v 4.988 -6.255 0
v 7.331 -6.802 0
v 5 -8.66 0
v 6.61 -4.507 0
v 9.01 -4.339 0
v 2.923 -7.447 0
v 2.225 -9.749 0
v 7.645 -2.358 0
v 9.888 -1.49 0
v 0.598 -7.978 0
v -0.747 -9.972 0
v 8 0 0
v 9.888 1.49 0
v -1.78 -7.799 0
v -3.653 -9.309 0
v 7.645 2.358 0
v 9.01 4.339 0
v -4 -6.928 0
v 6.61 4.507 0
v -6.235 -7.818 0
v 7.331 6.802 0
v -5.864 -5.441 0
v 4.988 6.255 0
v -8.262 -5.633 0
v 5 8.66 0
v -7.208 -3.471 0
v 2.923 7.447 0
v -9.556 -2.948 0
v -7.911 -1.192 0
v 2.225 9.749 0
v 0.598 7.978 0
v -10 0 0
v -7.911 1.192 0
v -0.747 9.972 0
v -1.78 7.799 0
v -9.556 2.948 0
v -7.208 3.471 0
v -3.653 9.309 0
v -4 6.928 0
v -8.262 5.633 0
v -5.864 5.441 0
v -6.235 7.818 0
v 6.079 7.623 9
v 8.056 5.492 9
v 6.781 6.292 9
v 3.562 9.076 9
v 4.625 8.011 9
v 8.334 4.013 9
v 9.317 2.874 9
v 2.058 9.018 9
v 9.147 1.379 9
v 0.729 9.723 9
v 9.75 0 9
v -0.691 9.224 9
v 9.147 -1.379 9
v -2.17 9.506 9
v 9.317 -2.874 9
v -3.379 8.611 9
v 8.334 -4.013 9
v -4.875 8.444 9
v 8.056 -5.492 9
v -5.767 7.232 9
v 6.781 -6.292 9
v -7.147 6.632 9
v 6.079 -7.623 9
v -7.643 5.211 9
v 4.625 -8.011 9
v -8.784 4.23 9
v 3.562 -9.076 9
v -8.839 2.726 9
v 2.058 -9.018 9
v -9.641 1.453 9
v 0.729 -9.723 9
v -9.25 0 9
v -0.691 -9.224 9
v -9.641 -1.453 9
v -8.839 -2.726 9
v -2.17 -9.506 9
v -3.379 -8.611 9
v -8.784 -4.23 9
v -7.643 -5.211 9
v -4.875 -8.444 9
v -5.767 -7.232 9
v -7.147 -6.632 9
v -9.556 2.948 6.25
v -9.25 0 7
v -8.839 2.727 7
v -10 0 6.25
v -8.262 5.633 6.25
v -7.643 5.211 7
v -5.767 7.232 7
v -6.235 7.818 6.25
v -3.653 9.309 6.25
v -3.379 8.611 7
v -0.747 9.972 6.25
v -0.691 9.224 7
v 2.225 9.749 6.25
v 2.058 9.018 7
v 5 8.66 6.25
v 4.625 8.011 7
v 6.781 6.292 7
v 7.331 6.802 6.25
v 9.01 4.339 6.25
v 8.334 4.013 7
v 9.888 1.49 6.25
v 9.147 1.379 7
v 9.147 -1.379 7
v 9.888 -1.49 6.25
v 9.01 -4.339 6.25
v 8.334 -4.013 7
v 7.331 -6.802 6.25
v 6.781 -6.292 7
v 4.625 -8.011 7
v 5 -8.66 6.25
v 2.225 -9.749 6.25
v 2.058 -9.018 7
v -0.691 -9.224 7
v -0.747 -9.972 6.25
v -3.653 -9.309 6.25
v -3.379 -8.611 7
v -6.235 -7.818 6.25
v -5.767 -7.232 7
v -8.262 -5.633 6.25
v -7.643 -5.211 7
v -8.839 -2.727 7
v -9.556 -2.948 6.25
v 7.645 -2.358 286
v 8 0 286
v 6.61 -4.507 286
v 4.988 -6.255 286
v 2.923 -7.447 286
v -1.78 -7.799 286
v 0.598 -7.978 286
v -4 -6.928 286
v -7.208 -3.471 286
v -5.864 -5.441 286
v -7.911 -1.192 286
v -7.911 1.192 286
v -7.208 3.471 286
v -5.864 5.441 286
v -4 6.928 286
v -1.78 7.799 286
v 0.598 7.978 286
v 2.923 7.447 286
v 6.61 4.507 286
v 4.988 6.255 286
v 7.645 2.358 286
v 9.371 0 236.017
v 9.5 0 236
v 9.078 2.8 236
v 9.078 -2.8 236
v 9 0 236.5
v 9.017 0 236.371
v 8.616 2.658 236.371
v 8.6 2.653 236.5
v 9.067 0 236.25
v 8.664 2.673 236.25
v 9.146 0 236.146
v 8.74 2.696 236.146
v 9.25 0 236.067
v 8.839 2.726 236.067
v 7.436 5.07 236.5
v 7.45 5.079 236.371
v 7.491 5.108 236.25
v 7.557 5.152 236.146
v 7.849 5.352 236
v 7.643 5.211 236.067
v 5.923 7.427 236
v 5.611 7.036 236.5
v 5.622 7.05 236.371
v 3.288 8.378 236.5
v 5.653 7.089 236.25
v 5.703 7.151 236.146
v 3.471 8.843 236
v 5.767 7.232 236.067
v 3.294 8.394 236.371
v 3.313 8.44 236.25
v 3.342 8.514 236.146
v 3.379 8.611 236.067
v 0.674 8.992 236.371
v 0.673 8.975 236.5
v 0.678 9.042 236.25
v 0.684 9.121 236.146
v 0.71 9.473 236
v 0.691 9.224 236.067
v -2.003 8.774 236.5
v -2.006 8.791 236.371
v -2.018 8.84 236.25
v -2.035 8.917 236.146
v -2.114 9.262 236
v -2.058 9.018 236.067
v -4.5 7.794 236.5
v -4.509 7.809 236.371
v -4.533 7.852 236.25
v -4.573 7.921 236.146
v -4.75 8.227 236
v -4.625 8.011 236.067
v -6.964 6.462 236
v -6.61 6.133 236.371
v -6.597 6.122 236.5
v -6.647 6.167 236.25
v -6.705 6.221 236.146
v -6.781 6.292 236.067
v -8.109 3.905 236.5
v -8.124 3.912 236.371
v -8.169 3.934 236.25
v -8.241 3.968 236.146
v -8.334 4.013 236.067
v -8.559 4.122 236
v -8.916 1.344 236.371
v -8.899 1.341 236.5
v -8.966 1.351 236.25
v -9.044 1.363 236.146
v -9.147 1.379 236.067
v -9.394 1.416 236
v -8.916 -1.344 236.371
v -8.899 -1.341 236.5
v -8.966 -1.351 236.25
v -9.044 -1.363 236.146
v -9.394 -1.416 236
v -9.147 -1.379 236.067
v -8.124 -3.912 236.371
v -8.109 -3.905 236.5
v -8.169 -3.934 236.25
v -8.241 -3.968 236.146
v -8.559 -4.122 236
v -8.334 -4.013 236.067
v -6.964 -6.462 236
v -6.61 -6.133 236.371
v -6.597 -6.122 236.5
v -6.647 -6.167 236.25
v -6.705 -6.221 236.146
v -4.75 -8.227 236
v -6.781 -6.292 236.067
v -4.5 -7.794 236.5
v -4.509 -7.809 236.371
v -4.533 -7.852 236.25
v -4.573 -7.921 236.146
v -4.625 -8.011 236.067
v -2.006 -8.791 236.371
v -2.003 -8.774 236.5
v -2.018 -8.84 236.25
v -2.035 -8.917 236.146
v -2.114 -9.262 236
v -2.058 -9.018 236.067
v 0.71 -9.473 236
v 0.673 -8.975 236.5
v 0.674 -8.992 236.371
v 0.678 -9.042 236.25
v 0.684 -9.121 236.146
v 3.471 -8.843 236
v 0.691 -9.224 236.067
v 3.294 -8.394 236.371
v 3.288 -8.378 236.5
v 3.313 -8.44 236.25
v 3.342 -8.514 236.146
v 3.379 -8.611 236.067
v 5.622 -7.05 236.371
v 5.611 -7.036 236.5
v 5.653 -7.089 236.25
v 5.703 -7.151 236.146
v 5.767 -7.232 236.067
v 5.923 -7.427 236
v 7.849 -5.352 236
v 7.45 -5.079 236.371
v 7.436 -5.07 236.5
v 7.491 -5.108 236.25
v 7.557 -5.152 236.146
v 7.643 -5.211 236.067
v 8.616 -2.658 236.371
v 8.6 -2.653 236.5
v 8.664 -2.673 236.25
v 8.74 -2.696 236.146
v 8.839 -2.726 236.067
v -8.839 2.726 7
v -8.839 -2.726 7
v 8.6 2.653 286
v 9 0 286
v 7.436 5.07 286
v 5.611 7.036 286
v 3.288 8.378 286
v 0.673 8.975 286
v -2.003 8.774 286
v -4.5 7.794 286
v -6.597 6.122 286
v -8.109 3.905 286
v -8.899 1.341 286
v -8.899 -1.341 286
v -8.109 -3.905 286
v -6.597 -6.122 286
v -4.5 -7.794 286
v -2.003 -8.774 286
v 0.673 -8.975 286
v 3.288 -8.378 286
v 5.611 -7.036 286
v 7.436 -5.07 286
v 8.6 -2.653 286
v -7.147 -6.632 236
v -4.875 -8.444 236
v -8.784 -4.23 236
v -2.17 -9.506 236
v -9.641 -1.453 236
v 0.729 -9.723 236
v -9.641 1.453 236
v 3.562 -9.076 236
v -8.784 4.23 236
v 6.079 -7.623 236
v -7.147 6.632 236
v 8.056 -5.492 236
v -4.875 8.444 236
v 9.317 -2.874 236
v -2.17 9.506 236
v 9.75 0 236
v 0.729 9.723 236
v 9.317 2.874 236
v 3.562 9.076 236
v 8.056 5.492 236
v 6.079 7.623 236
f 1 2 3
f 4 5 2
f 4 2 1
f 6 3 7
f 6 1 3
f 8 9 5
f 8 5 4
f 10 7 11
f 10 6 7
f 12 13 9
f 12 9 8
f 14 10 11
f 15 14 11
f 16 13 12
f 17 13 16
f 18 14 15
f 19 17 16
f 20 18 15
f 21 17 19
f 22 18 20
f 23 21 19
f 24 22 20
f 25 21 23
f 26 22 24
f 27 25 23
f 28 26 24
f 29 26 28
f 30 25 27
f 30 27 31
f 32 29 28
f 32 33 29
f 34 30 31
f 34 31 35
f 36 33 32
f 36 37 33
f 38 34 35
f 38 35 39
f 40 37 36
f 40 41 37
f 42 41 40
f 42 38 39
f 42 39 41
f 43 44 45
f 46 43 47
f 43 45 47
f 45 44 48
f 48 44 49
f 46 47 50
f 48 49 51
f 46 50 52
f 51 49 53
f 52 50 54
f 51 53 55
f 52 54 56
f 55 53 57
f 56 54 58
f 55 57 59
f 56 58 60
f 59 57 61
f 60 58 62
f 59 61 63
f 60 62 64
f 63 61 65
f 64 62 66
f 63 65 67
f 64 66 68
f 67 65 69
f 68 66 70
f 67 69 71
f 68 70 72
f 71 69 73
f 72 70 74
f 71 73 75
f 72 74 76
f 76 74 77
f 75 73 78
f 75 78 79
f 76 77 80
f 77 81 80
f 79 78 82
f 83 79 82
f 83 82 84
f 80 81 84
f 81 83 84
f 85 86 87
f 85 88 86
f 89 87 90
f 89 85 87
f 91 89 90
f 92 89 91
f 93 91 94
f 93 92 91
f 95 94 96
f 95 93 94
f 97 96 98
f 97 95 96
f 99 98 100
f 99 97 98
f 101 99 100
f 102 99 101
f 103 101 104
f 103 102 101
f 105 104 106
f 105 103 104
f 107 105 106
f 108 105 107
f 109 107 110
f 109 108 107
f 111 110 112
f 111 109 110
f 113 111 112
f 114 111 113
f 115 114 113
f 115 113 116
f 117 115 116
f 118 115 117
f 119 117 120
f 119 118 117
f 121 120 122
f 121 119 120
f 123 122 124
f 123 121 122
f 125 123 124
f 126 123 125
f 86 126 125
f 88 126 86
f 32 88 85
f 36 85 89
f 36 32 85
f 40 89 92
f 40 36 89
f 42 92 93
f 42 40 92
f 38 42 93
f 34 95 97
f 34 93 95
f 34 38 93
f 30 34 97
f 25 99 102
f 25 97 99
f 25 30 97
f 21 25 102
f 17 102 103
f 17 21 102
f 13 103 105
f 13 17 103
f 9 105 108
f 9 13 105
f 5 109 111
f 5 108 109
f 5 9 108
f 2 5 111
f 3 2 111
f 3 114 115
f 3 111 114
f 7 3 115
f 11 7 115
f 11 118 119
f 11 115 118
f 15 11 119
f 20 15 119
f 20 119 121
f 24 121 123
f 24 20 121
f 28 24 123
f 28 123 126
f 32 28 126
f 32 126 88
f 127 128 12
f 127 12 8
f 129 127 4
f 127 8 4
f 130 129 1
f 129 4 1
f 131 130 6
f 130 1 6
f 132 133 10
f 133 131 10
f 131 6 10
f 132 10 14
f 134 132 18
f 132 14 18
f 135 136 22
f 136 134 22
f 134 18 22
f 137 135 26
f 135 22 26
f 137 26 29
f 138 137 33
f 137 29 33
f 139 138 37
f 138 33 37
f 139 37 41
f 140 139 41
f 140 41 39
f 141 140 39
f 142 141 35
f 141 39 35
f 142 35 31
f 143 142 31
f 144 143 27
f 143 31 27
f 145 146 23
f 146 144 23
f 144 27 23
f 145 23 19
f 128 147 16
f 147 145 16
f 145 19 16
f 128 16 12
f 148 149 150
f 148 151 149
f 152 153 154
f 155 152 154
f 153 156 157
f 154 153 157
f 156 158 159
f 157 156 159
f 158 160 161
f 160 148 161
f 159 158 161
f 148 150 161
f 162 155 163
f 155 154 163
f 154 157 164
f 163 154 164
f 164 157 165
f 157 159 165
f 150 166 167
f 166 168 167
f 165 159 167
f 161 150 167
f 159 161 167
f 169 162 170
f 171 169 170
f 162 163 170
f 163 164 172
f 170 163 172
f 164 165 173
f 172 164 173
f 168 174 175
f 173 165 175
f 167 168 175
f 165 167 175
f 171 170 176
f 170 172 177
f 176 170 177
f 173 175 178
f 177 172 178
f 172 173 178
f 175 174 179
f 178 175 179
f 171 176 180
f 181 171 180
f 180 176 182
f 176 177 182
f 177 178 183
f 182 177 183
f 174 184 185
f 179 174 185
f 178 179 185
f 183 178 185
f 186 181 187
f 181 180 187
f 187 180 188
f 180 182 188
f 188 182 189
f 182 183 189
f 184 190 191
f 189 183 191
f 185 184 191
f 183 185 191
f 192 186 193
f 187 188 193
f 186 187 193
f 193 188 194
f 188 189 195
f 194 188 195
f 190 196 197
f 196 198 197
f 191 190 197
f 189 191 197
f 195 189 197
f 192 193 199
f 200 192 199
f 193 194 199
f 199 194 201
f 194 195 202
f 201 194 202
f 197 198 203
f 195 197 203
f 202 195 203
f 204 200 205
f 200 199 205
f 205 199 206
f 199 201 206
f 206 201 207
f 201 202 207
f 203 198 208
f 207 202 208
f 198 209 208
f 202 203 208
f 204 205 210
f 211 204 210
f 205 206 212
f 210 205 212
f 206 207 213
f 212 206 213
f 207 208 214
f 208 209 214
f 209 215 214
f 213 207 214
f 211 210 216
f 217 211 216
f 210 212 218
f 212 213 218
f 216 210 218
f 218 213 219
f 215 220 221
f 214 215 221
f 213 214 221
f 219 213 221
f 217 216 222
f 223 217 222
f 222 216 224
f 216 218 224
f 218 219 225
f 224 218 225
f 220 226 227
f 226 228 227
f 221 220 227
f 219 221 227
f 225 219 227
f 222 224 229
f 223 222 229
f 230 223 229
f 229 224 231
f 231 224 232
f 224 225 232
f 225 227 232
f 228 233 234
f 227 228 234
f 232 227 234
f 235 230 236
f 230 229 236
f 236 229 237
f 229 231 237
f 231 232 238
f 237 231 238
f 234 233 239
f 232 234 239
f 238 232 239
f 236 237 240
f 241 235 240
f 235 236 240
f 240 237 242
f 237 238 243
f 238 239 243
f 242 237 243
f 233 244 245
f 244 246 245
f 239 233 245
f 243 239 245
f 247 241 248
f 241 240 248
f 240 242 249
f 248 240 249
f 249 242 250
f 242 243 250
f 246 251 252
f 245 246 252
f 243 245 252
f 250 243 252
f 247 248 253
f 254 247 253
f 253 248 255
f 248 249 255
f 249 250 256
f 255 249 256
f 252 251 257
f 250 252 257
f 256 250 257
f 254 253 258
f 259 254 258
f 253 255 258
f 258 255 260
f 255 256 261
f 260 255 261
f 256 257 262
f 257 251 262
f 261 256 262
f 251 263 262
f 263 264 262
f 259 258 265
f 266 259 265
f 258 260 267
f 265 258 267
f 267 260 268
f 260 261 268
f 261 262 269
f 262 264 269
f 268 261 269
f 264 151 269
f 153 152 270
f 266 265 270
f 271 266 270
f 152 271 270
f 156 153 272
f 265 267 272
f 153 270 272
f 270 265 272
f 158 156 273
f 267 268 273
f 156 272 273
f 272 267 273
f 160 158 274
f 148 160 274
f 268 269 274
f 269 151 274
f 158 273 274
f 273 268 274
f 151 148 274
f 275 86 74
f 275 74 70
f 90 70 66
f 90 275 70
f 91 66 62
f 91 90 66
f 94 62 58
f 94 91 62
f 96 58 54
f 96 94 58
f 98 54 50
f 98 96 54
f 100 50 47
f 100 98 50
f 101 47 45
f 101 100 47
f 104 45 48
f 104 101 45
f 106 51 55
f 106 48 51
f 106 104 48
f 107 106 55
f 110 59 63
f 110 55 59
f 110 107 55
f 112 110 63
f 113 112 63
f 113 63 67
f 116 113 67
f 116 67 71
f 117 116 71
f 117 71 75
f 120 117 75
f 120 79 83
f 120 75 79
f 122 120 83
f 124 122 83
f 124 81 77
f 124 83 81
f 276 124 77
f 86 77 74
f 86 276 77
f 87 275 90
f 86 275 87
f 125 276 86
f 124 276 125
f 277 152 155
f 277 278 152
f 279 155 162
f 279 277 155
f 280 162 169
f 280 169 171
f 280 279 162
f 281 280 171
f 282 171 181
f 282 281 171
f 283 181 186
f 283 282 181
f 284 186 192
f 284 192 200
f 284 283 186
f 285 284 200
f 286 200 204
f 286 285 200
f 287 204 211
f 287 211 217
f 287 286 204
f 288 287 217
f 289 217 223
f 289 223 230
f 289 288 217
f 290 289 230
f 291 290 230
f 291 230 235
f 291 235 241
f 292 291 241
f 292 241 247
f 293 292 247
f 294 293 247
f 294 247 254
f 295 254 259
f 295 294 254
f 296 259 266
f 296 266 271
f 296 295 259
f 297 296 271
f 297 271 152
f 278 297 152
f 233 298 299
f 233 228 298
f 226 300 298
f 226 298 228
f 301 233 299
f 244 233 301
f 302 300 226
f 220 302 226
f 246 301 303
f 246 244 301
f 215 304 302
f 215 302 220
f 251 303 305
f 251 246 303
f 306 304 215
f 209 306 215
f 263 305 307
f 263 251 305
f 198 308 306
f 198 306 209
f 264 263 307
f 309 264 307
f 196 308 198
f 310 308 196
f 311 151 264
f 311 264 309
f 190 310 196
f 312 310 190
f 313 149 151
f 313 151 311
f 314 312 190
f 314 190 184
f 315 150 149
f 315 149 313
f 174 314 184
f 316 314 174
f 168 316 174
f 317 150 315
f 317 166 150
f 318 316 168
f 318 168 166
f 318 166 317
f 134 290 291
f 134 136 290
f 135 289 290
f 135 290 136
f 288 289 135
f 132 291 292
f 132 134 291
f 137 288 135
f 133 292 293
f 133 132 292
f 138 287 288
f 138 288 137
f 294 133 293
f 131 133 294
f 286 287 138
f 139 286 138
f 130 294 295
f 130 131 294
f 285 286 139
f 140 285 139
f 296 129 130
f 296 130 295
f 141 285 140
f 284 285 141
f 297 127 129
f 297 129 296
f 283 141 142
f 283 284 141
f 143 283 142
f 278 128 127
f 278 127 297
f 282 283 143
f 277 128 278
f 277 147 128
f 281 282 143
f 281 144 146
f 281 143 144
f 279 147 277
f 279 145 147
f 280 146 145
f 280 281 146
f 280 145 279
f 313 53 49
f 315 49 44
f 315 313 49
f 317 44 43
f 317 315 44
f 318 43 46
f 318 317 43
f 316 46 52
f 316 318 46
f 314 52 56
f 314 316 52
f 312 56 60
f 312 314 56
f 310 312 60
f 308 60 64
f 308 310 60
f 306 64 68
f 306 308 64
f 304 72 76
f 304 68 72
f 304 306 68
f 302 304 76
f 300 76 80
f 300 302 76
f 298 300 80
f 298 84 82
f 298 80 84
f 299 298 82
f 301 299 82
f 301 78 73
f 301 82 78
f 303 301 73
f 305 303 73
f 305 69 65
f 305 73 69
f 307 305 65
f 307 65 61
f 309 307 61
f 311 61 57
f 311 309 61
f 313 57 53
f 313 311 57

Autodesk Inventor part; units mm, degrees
ref_plane "YZ Plane" through (0, 0, 0) normal (1, 0, 0) x (0, 1, 0)
ref_plane "XZ Plane" through (0, 0, 0) normal (0, 1, 0) x (-1, 0, 0)
ref_plane "XY Plane" through (0, 0, 0) normal (0, 0, 1) x (1, 0, 0)
sketch "Skizze1" plane through (0, 0, 0) normal (0, 0, 1) x (1, 0, 0)
  circle A0 centre (0, 0) radius 8
  circle A1 centre (0, 0) radius 10.05
  dimension "d0" = 20.1
  dimension "d1" = 2.05
extrude "Extrusion1" add sketch "Skizze1" along normal blind 286
sketch "Skizze2" plane through (0, 0, 286) normal (0, 0, 1) x (1, 0, 0)
  circle A0 centre (0, 0) radius 10.05 projected
  circle A1 centre (0, 0) radius 9.75
  dimension "d4" = 19.5
extrude "Extrusion2" cut sketch "Skizze2" against normal through all
sketch "Skizze3" plane through (0, 0, 0) normal (0, 0, -1) x (-1, 0, 0)
  circle A0 centre (0, 0) radius 9.75 projected
  circle A1 centre (0, 0) radius 8 projected
  circle A2 centre (0, 0) radius 10
  dimension "d7" = 20
extrude "Extrusion3" add sketch "Skizze3" against normal blind 9 contours A2
sketch "Skizze4" plane through (0, 0, 286) normal (0, 0, 1) x (1, 0, 0)
  circle A0 centre (0, 0) radius 9.75 projected
  circle A1 centre (0, 0) radius 8 projected
  circle A2 centre (0, 0) radius 9
  dimension "d10" = 18
extrude "Extrusion4" cut sketch "Skizze4" against normal blind 50 contours A0
sketch "Skizze5" plane through (0, 0, 0) normal (0, 1, 0) x (-1, 0, 0)
  line L0 (-10, 9) -> (10, 9) projected
  line L1 (10, 0) -> (-10, 0) projected
  line L2 (-9.75, 236) -> (9.75, 236) projected
  line L3 (10, 0) -> (10, 9) projected
  line L4 (8, 0) -> (8, 286) projected
  line L5 (9.75, 236) -> (9.75, 9) projected
  line L6 (10, 9) -> (9.25, 9)
  line L7 (9.25, 9) -> (9.25, 7)
  line L8 (9.25, 7) -> (10, 7)
  line L9 (10, 7) -> (10, 9)
  line L10 (14, 0) -> (-14, 0) projected
  line L11 (0, -57.2) -> (0, 343.2) projected
  point P0 (0, 0)
  point P1 (9.9, 9)
  point P2 (-9.9, 9)
  point P3 (9.75, 9)
  dimension "d13" = 2
  dimension "d14" = 18.5
revolve "Umdrehung1" cut sketch "Skizze5" angle 360 about axis through (0, 0, -10) along (0, 0, 1) contours L0 L3 L8 L7
chamfer "Fase1" distance 0.75 angle 45 1 edges at (10, 0, 7)
thread "Gewinde2" size "M20x1" class "6g" standard "ANSI Metric M Profile" full length
fillet "Rundung1" radius 0.5 1 edges at (-9, 0, 236)
properties part number "13_0204_024"
